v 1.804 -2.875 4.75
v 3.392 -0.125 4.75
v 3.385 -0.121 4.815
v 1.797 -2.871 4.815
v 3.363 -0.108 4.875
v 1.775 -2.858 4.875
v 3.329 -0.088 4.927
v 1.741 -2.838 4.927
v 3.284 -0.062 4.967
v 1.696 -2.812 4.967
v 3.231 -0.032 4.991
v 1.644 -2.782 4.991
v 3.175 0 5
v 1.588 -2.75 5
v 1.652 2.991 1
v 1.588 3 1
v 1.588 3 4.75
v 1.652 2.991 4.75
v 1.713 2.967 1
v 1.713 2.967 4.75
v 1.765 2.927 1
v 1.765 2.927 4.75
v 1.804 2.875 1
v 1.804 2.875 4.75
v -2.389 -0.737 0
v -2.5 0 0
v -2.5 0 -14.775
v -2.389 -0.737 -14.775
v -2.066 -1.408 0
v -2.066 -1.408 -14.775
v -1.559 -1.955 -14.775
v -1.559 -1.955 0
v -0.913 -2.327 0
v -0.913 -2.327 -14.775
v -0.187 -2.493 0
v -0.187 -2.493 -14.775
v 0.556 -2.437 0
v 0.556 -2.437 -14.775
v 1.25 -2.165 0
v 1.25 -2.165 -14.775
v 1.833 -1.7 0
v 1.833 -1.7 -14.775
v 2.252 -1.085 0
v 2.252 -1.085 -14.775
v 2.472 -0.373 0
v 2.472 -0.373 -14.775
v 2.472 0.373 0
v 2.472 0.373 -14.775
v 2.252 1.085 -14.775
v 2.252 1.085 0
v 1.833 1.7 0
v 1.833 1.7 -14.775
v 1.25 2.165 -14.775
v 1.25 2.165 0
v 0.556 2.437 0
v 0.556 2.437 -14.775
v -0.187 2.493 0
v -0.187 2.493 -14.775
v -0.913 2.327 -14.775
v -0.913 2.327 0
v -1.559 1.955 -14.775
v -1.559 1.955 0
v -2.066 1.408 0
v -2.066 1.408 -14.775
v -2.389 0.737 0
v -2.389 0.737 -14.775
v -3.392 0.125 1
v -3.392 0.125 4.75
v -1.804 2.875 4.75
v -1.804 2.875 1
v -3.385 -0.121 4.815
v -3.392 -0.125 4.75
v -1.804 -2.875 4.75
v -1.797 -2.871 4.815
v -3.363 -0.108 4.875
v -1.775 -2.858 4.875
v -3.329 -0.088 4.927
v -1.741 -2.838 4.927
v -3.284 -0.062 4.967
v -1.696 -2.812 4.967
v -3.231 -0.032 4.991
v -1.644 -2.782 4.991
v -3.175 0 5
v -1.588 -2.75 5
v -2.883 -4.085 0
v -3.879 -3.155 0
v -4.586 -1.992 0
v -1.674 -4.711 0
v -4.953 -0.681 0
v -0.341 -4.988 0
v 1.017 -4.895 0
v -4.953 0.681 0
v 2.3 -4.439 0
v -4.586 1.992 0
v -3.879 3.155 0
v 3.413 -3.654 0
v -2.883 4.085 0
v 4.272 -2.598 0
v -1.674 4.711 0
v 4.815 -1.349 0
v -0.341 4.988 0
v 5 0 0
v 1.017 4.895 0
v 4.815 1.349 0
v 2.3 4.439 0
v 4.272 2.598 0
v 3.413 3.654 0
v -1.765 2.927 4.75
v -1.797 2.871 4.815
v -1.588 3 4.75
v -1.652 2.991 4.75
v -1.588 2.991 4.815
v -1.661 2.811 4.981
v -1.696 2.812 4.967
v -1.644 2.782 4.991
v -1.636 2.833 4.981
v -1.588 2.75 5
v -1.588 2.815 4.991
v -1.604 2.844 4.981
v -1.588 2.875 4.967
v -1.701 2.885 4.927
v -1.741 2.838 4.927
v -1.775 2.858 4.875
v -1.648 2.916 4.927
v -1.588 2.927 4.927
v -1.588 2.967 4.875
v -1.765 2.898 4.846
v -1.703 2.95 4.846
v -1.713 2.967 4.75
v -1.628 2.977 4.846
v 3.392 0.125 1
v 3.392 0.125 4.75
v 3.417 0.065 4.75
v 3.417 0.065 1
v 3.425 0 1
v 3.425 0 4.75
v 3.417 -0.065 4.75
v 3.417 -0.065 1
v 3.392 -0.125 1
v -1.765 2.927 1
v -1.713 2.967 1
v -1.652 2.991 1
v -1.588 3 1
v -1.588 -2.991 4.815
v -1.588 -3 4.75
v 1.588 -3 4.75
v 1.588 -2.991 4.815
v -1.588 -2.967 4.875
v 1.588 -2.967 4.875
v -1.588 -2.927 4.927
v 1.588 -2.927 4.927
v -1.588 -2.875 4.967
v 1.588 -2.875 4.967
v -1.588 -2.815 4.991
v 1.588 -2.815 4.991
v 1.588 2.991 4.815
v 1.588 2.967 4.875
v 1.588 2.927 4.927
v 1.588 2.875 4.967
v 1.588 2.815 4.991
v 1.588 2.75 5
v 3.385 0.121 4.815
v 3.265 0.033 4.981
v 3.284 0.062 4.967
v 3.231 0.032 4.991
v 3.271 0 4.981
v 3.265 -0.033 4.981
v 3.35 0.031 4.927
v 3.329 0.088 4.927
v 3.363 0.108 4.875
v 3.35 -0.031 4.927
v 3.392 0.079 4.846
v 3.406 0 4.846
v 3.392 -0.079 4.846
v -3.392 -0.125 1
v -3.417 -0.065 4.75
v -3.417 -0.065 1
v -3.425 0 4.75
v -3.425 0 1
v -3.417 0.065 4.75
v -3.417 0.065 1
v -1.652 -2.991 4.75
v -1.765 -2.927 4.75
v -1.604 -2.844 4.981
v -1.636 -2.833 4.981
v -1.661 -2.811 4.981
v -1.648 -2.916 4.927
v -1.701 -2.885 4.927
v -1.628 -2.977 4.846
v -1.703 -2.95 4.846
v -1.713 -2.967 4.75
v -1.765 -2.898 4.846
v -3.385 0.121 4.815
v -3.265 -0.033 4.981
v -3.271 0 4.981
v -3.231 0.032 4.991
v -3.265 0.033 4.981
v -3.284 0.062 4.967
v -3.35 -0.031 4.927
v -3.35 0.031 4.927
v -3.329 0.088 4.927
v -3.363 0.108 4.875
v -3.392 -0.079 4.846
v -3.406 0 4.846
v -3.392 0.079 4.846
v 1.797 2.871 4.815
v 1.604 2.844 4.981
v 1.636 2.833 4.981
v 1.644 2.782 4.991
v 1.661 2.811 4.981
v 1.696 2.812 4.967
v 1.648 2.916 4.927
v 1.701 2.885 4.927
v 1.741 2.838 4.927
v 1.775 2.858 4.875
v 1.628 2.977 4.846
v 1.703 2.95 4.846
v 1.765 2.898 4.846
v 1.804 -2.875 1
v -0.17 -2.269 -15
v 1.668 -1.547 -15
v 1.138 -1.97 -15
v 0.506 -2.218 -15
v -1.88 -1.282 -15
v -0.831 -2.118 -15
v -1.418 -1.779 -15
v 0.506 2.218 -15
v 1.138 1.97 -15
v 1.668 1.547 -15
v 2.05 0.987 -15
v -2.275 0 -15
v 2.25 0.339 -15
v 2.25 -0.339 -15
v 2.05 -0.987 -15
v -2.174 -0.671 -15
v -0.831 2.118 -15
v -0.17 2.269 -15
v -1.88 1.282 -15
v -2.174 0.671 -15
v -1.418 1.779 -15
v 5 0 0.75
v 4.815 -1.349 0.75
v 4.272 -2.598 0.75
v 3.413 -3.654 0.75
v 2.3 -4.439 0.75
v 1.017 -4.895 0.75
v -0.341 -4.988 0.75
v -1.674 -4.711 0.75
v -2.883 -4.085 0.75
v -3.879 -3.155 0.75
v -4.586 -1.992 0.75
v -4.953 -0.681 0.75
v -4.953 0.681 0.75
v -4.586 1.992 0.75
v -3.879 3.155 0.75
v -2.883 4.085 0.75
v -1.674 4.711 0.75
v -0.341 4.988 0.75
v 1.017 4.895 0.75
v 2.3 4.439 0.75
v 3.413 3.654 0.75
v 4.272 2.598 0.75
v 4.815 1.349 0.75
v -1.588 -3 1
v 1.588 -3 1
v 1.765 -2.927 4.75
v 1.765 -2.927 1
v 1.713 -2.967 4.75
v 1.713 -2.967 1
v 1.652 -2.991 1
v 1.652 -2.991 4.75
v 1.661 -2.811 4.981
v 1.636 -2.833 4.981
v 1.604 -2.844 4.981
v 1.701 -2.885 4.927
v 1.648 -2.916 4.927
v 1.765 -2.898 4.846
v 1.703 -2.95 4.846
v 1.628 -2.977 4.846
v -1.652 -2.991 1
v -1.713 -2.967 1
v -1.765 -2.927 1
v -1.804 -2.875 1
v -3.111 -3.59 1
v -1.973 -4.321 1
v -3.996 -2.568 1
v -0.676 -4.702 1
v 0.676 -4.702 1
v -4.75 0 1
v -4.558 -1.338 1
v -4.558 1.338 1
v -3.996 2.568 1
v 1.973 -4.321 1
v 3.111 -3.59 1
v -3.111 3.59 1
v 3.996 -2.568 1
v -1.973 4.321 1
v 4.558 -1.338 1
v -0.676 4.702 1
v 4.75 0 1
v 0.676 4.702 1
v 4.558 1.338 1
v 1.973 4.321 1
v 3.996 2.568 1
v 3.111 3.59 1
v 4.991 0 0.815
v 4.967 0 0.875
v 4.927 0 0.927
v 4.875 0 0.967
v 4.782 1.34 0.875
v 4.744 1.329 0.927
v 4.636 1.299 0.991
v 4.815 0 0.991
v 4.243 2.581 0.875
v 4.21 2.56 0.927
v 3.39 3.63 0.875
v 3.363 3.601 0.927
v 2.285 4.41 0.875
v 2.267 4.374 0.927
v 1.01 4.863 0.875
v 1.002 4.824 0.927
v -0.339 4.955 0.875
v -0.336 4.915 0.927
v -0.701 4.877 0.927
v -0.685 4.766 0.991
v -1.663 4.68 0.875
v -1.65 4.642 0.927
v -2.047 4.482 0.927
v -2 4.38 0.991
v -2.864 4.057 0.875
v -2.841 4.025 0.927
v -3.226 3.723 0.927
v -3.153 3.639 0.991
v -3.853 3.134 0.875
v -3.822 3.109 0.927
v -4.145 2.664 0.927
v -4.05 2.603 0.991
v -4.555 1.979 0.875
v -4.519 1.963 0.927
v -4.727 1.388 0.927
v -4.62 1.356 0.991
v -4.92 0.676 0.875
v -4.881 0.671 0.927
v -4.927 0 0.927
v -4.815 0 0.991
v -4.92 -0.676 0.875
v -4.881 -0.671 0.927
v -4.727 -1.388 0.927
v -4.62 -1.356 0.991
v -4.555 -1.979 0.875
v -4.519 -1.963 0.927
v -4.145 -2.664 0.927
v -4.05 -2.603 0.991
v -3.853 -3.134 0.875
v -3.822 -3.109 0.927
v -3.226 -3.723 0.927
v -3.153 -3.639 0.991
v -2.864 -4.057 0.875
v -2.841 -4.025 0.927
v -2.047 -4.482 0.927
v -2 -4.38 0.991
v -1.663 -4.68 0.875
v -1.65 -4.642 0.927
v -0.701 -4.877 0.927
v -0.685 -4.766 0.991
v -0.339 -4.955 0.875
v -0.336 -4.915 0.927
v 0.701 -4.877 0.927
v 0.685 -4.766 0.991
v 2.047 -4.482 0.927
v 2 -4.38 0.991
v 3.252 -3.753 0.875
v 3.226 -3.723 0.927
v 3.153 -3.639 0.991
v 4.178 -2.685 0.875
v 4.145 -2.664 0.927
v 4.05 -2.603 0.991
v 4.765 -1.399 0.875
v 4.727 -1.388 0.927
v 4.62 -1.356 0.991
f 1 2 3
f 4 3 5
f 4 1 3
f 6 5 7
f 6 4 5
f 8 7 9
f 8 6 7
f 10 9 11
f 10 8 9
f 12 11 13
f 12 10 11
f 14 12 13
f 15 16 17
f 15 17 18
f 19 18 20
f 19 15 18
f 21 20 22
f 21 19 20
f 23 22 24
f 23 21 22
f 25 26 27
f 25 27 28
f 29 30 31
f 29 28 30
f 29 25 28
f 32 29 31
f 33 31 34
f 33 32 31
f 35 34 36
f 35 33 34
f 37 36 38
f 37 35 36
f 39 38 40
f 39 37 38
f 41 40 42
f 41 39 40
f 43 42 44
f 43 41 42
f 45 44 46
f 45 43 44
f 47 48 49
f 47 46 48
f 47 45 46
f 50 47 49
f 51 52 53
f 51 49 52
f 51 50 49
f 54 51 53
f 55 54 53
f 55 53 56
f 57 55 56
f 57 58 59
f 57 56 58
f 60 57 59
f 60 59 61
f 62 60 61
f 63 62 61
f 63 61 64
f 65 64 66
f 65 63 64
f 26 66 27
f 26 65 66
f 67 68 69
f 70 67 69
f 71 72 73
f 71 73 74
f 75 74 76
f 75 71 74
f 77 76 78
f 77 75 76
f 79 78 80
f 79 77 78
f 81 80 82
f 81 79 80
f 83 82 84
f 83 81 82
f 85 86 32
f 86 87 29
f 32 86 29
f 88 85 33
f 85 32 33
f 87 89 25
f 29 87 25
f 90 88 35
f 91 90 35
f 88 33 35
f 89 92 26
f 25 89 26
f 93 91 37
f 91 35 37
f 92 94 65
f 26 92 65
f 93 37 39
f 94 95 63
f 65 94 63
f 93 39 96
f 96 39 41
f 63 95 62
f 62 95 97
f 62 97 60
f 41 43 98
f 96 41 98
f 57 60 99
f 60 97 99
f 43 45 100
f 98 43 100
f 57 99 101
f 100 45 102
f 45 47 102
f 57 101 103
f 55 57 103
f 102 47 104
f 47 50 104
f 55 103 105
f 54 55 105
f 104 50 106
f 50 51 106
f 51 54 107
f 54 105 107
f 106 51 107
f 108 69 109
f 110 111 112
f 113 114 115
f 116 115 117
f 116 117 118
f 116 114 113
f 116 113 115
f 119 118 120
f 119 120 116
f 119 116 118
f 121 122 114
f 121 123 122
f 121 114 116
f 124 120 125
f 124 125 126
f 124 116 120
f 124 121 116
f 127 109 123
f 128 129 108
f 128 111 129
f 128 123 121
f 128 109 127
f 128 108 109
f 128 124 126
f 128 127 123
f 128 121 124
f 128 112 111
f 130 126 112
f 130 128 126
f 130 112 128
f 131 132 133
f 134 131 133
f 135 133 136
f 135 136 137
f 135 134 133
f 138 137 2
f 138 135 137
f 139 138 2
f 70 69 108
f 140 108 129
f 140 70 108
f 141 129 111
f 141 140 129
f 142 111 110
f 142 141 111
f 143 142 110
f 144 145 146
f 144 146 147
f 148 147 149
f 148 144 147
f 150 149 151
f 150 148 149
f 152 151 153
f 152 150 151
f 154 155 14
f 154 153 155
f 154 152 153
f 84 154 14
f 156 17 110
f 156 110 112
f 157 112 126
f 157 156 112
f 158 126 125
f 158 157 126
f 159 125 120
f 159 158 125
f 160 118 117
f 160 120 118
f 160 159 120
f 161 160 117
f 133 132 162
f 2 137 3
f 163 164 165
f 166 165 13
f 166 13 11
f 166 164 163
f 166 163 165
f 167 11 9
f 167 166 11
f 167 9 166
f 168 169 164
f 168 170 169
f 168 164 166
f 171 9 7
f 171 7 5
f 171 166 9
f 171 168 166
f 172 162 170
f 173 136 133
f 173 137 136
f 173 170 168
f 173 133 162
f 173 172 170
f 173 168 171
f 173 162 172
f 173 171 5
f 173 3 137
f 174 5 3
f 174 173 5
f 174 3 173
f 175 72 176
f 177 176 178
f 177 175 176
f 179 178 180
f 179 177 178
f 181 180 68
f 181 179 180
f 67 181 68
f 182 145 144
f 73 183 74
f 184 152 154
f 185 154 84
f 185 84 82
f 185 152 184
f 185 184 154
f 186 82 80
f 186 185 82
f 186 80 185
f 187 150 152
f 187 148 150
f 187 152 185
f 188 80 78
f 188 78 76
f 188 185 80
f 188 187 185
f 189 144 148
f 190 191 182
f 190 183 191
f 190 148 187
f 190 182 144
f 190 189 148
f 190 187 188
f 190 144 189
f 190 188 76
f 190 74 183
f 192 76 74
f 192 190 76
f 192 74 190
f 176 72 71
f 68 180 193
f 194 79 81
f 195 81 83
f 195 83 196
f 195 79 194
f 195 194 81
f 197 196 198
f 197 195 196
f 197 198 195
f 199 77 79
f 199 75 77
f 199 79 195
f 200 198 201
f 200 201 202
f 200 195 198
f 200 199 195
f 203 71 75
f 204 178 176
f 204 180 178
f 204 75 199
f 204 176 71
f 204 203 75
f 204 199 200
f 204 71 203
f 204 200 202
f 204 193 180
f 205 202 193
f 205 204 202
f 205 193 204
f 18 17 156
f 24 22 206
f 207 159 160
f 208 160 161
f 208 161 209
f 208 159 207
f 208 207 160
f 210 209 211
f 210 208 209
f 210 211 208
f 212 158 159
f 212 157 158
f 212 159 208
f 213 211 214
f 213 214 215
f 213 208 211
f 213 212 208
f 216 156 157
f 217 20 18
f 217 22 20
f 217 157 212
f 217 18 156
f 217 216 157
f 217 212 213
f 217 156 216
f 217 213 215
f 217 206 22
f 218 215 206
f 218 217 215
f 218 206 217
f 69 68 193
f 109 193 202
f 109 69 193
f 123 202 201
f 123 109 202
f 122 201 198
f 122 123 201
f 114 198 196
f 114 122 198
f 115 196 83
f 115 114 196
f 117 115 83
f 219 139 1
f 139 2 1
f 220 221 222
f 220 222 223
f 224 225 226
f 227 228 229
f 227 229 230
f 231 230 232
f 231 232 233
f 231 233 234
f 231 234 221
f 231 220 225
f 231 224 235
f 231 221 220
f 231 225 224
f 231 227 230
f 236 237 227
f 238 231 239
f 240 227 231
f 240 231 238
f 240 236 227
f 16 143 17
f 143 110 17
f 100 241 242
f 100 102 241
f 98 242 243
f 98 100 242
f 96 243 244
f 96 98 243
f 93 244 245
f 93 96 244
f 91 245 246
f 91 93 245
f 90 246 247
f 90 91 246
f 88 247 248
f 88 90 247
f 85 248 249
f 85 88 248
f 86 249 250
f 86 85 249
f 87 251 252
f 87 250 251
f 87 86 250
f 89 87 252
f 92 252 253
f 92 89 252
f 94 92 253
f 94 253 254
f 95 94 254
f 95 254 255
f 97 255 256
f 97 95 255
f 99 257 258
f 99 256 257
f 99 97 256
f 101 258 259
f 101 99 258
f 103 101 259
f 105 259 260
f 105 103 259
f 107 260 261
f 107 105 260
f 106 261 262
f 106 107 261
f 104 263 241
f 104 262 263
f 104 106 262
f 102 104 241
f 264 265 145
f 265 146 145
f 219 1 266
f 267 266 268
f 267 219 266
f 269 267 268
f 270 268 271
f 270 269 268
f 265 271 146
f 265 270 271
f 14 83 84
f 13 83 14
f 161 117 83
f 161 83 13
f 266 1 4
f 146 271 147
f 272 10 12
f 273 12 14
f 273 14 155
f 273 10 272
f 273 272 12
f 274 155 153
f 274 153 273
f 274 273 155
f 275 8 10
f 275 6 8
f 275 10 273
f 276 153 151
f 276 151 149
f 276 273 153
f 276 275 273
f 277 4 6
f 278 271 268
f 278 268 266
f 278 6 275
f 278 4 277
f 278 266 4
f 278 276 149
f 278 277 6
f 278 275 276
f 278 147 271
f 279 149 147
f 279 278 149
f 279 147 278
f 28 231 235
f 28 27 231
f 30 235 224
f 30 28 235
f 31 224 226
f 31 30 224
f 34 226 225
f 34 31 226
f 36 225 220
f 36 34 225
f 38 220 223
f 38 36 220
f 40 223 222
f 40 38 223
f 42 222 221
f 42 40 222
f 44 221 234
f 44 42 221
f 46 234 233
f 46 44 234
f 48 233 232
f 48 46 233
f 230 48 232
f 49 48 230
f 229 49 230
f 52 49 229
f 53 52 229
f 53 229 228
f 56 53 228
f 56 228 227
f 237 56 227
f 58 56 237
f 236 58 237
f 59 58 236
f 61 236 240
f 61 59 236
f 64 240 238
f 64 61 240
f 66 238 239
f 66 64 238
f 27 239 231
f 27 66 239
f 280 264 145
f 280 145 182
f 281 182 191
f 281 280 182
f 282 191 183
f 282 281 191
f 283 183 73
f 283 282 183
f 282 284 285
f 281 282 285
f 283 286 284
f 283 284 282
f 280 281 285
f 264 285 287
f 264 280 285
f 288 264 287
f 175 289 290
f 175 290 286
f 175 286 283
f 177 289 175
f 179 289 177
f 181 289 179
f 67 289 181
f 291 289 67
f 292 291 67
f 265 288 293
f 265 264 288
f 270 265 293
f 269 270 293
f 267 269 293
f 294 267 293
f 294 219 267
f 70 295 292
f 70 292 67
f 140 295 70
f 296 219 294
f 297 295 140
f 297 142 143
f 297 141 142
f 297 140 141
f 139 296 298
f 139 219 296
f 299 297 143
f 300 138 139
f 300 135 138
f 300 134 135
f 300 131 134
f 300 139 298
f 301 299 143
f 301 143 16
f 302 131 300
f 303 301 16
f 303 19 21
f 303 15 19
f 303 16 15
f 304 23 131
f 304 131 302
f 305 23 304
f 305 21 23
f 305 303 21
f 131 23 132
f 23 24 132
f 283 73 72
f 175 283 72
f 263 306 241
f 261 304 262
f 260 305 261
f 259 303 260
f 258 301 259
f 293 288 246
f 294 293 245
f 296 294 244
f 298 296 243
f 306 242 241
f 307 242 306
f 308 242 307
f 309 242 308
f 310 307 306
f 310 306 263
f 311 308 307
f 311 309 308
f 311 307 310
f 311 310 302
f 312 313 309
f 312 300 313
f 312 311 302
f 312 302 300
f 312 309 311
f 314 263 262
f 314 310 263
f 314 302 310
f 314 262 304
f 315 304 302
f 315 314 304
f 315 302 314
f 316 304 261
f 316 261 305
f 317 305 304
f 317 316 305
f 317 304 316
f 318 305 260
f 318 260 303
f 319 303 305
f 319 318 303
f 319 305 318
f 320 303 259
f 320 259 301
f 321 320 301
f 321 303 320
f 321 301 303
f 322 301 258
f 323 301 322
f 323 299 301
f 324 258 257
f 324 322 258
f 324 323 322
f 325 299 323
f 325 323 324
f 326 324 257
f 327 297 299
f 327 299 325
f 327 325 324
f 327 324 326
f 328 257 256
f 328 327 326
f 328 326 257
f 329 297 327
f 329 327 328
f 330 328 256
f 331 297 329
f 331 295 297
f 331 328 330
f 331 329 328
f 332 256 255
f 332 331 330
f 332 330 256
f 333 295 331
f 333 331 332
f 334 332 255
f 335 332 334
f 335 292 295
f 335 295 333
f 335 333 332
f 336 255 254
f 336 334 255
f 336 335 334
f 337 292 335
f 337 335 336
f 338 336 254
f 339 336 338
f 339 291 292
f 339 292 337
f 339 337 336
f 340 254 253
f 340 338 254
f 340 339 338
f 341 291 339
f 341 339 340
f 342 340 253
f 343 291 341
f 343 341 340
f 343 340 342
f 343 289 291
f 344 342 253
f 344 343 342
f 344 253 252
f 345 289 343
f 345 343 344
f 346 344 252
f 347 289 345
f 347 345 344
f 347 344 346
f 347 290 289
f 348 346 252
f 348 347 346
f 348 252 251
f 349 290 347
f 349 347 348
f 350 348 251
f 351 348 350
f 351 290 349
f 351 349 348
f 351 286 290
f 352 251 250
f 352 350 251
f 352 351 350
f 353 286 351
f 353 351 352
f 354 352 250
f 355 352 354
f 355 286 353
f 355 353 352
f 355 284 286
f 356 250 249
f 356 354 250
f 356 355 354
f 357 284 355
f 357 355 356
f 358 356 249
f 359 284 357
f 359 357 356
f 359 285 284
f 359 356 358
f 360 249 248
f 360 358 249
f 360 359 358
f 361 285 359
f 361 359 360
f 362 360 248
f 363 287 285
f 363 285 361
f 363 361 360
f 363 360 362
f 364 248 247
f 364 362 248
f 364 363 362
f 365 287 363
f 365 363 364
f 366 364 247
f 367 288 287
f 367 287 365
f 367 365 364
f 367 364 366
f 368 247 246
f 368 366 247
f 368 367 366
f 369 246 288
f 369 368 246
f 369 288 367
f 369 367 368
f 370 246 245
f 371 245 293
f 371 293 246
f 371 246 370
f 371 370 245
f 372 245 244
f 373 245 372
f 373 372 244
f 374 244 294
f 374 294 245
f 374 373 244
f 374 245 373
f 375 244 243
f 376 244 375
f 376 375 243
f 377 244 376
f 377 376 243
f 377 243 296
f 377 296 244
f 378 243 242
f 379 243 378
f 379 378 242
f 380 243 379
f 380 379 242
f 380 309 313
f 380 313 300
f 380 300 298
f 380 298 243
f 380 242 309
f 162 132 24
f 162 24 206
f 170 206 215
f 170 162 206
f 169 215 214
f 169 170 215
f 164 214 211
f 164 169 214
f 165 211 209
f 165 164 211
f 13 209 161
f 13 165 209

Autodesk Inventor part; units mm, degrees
ref_plane "YZ Plane" through (0, 0, 0) normal (1, 0, 0) x (0, 1, 0)
ref_plane "XZ Plane" through (0, 0, 0) normal (0, 1, 0) x (-1, 0, 0)
ref_plane "XY Plane" through (0, 0, 0) normal (0, 0, 1) x (1, 0, 0)
sketch "草图1" plane through (0, 0, 0) normal (0, 0, 1) x (1, 0, 0)
  circle A0 centre (0, 0) radius 5
  dimension "d0" = 10
extrude "拉伸1" add sketch "草图1" along normal blind 5
sketch "草图2" plane through (0, 0, 5) normal (0, 0, 1) x (1, 0, 0)
  circle A0 centre (0, 0) radius 5
  circle A1 centre (0, 0) radius 5 projected
  line L0 (1.7321, -3) -> (-1.7321, -3)
  line L1 (-1.7321, -3) -> (-3.4641, 0)
  line L2 (-3.4641, 0) -> (-1.7321, 3)
  line L3 (-1.7321, 3) -> (1.7321, 3)
  line L4 (1.7321, 3) -> (3.4641, 0)
  line L5 (3.4641, 0) -> (1.7321, -3)
  line L6 (0, 0) -> (0, 1.0367)
  point P0 (0, 3)
  dimension "d3" = 1.0367
  dimension "d4" = 6
extrude "拉伸2" cut sketch "草图2" against normal blind 4
fillet "圆角1" radius 0.25 13 edges at (-5, 0, 1) (1.7321, 3, 3) (-2.5981, 1.5, 5) (0, 3, 5) (-1.7321, 3, 3) (-3.4641, 0, 3) (-2.5981, -1.5, 5) (-1.7321, -3, 3) (0, -3, 5) (2.5981, -1.5, 5) (1.7321, -3, 3) (3.4641, 0, 3) (2.5981, 1.5, 5)
sketch "草图3" plane through (0, 0, 0) normal (0, 0, -1) x (-1, 0, 0)
  circle A0 centre (0, 0) radius 2.5
  dimension "d8" = 5
extrude "拉伸3" add sketch "草图3" along normal blind 15
thread "螺纹1" size "M5x0.8" class "6g" standard "ANSI Metric M Profile" full length
chamfer "倒角1" distance 0.225 angle 45 1 edges at (2.5, 0, -15)
properties part number "载板下弹片固定螺丝"
